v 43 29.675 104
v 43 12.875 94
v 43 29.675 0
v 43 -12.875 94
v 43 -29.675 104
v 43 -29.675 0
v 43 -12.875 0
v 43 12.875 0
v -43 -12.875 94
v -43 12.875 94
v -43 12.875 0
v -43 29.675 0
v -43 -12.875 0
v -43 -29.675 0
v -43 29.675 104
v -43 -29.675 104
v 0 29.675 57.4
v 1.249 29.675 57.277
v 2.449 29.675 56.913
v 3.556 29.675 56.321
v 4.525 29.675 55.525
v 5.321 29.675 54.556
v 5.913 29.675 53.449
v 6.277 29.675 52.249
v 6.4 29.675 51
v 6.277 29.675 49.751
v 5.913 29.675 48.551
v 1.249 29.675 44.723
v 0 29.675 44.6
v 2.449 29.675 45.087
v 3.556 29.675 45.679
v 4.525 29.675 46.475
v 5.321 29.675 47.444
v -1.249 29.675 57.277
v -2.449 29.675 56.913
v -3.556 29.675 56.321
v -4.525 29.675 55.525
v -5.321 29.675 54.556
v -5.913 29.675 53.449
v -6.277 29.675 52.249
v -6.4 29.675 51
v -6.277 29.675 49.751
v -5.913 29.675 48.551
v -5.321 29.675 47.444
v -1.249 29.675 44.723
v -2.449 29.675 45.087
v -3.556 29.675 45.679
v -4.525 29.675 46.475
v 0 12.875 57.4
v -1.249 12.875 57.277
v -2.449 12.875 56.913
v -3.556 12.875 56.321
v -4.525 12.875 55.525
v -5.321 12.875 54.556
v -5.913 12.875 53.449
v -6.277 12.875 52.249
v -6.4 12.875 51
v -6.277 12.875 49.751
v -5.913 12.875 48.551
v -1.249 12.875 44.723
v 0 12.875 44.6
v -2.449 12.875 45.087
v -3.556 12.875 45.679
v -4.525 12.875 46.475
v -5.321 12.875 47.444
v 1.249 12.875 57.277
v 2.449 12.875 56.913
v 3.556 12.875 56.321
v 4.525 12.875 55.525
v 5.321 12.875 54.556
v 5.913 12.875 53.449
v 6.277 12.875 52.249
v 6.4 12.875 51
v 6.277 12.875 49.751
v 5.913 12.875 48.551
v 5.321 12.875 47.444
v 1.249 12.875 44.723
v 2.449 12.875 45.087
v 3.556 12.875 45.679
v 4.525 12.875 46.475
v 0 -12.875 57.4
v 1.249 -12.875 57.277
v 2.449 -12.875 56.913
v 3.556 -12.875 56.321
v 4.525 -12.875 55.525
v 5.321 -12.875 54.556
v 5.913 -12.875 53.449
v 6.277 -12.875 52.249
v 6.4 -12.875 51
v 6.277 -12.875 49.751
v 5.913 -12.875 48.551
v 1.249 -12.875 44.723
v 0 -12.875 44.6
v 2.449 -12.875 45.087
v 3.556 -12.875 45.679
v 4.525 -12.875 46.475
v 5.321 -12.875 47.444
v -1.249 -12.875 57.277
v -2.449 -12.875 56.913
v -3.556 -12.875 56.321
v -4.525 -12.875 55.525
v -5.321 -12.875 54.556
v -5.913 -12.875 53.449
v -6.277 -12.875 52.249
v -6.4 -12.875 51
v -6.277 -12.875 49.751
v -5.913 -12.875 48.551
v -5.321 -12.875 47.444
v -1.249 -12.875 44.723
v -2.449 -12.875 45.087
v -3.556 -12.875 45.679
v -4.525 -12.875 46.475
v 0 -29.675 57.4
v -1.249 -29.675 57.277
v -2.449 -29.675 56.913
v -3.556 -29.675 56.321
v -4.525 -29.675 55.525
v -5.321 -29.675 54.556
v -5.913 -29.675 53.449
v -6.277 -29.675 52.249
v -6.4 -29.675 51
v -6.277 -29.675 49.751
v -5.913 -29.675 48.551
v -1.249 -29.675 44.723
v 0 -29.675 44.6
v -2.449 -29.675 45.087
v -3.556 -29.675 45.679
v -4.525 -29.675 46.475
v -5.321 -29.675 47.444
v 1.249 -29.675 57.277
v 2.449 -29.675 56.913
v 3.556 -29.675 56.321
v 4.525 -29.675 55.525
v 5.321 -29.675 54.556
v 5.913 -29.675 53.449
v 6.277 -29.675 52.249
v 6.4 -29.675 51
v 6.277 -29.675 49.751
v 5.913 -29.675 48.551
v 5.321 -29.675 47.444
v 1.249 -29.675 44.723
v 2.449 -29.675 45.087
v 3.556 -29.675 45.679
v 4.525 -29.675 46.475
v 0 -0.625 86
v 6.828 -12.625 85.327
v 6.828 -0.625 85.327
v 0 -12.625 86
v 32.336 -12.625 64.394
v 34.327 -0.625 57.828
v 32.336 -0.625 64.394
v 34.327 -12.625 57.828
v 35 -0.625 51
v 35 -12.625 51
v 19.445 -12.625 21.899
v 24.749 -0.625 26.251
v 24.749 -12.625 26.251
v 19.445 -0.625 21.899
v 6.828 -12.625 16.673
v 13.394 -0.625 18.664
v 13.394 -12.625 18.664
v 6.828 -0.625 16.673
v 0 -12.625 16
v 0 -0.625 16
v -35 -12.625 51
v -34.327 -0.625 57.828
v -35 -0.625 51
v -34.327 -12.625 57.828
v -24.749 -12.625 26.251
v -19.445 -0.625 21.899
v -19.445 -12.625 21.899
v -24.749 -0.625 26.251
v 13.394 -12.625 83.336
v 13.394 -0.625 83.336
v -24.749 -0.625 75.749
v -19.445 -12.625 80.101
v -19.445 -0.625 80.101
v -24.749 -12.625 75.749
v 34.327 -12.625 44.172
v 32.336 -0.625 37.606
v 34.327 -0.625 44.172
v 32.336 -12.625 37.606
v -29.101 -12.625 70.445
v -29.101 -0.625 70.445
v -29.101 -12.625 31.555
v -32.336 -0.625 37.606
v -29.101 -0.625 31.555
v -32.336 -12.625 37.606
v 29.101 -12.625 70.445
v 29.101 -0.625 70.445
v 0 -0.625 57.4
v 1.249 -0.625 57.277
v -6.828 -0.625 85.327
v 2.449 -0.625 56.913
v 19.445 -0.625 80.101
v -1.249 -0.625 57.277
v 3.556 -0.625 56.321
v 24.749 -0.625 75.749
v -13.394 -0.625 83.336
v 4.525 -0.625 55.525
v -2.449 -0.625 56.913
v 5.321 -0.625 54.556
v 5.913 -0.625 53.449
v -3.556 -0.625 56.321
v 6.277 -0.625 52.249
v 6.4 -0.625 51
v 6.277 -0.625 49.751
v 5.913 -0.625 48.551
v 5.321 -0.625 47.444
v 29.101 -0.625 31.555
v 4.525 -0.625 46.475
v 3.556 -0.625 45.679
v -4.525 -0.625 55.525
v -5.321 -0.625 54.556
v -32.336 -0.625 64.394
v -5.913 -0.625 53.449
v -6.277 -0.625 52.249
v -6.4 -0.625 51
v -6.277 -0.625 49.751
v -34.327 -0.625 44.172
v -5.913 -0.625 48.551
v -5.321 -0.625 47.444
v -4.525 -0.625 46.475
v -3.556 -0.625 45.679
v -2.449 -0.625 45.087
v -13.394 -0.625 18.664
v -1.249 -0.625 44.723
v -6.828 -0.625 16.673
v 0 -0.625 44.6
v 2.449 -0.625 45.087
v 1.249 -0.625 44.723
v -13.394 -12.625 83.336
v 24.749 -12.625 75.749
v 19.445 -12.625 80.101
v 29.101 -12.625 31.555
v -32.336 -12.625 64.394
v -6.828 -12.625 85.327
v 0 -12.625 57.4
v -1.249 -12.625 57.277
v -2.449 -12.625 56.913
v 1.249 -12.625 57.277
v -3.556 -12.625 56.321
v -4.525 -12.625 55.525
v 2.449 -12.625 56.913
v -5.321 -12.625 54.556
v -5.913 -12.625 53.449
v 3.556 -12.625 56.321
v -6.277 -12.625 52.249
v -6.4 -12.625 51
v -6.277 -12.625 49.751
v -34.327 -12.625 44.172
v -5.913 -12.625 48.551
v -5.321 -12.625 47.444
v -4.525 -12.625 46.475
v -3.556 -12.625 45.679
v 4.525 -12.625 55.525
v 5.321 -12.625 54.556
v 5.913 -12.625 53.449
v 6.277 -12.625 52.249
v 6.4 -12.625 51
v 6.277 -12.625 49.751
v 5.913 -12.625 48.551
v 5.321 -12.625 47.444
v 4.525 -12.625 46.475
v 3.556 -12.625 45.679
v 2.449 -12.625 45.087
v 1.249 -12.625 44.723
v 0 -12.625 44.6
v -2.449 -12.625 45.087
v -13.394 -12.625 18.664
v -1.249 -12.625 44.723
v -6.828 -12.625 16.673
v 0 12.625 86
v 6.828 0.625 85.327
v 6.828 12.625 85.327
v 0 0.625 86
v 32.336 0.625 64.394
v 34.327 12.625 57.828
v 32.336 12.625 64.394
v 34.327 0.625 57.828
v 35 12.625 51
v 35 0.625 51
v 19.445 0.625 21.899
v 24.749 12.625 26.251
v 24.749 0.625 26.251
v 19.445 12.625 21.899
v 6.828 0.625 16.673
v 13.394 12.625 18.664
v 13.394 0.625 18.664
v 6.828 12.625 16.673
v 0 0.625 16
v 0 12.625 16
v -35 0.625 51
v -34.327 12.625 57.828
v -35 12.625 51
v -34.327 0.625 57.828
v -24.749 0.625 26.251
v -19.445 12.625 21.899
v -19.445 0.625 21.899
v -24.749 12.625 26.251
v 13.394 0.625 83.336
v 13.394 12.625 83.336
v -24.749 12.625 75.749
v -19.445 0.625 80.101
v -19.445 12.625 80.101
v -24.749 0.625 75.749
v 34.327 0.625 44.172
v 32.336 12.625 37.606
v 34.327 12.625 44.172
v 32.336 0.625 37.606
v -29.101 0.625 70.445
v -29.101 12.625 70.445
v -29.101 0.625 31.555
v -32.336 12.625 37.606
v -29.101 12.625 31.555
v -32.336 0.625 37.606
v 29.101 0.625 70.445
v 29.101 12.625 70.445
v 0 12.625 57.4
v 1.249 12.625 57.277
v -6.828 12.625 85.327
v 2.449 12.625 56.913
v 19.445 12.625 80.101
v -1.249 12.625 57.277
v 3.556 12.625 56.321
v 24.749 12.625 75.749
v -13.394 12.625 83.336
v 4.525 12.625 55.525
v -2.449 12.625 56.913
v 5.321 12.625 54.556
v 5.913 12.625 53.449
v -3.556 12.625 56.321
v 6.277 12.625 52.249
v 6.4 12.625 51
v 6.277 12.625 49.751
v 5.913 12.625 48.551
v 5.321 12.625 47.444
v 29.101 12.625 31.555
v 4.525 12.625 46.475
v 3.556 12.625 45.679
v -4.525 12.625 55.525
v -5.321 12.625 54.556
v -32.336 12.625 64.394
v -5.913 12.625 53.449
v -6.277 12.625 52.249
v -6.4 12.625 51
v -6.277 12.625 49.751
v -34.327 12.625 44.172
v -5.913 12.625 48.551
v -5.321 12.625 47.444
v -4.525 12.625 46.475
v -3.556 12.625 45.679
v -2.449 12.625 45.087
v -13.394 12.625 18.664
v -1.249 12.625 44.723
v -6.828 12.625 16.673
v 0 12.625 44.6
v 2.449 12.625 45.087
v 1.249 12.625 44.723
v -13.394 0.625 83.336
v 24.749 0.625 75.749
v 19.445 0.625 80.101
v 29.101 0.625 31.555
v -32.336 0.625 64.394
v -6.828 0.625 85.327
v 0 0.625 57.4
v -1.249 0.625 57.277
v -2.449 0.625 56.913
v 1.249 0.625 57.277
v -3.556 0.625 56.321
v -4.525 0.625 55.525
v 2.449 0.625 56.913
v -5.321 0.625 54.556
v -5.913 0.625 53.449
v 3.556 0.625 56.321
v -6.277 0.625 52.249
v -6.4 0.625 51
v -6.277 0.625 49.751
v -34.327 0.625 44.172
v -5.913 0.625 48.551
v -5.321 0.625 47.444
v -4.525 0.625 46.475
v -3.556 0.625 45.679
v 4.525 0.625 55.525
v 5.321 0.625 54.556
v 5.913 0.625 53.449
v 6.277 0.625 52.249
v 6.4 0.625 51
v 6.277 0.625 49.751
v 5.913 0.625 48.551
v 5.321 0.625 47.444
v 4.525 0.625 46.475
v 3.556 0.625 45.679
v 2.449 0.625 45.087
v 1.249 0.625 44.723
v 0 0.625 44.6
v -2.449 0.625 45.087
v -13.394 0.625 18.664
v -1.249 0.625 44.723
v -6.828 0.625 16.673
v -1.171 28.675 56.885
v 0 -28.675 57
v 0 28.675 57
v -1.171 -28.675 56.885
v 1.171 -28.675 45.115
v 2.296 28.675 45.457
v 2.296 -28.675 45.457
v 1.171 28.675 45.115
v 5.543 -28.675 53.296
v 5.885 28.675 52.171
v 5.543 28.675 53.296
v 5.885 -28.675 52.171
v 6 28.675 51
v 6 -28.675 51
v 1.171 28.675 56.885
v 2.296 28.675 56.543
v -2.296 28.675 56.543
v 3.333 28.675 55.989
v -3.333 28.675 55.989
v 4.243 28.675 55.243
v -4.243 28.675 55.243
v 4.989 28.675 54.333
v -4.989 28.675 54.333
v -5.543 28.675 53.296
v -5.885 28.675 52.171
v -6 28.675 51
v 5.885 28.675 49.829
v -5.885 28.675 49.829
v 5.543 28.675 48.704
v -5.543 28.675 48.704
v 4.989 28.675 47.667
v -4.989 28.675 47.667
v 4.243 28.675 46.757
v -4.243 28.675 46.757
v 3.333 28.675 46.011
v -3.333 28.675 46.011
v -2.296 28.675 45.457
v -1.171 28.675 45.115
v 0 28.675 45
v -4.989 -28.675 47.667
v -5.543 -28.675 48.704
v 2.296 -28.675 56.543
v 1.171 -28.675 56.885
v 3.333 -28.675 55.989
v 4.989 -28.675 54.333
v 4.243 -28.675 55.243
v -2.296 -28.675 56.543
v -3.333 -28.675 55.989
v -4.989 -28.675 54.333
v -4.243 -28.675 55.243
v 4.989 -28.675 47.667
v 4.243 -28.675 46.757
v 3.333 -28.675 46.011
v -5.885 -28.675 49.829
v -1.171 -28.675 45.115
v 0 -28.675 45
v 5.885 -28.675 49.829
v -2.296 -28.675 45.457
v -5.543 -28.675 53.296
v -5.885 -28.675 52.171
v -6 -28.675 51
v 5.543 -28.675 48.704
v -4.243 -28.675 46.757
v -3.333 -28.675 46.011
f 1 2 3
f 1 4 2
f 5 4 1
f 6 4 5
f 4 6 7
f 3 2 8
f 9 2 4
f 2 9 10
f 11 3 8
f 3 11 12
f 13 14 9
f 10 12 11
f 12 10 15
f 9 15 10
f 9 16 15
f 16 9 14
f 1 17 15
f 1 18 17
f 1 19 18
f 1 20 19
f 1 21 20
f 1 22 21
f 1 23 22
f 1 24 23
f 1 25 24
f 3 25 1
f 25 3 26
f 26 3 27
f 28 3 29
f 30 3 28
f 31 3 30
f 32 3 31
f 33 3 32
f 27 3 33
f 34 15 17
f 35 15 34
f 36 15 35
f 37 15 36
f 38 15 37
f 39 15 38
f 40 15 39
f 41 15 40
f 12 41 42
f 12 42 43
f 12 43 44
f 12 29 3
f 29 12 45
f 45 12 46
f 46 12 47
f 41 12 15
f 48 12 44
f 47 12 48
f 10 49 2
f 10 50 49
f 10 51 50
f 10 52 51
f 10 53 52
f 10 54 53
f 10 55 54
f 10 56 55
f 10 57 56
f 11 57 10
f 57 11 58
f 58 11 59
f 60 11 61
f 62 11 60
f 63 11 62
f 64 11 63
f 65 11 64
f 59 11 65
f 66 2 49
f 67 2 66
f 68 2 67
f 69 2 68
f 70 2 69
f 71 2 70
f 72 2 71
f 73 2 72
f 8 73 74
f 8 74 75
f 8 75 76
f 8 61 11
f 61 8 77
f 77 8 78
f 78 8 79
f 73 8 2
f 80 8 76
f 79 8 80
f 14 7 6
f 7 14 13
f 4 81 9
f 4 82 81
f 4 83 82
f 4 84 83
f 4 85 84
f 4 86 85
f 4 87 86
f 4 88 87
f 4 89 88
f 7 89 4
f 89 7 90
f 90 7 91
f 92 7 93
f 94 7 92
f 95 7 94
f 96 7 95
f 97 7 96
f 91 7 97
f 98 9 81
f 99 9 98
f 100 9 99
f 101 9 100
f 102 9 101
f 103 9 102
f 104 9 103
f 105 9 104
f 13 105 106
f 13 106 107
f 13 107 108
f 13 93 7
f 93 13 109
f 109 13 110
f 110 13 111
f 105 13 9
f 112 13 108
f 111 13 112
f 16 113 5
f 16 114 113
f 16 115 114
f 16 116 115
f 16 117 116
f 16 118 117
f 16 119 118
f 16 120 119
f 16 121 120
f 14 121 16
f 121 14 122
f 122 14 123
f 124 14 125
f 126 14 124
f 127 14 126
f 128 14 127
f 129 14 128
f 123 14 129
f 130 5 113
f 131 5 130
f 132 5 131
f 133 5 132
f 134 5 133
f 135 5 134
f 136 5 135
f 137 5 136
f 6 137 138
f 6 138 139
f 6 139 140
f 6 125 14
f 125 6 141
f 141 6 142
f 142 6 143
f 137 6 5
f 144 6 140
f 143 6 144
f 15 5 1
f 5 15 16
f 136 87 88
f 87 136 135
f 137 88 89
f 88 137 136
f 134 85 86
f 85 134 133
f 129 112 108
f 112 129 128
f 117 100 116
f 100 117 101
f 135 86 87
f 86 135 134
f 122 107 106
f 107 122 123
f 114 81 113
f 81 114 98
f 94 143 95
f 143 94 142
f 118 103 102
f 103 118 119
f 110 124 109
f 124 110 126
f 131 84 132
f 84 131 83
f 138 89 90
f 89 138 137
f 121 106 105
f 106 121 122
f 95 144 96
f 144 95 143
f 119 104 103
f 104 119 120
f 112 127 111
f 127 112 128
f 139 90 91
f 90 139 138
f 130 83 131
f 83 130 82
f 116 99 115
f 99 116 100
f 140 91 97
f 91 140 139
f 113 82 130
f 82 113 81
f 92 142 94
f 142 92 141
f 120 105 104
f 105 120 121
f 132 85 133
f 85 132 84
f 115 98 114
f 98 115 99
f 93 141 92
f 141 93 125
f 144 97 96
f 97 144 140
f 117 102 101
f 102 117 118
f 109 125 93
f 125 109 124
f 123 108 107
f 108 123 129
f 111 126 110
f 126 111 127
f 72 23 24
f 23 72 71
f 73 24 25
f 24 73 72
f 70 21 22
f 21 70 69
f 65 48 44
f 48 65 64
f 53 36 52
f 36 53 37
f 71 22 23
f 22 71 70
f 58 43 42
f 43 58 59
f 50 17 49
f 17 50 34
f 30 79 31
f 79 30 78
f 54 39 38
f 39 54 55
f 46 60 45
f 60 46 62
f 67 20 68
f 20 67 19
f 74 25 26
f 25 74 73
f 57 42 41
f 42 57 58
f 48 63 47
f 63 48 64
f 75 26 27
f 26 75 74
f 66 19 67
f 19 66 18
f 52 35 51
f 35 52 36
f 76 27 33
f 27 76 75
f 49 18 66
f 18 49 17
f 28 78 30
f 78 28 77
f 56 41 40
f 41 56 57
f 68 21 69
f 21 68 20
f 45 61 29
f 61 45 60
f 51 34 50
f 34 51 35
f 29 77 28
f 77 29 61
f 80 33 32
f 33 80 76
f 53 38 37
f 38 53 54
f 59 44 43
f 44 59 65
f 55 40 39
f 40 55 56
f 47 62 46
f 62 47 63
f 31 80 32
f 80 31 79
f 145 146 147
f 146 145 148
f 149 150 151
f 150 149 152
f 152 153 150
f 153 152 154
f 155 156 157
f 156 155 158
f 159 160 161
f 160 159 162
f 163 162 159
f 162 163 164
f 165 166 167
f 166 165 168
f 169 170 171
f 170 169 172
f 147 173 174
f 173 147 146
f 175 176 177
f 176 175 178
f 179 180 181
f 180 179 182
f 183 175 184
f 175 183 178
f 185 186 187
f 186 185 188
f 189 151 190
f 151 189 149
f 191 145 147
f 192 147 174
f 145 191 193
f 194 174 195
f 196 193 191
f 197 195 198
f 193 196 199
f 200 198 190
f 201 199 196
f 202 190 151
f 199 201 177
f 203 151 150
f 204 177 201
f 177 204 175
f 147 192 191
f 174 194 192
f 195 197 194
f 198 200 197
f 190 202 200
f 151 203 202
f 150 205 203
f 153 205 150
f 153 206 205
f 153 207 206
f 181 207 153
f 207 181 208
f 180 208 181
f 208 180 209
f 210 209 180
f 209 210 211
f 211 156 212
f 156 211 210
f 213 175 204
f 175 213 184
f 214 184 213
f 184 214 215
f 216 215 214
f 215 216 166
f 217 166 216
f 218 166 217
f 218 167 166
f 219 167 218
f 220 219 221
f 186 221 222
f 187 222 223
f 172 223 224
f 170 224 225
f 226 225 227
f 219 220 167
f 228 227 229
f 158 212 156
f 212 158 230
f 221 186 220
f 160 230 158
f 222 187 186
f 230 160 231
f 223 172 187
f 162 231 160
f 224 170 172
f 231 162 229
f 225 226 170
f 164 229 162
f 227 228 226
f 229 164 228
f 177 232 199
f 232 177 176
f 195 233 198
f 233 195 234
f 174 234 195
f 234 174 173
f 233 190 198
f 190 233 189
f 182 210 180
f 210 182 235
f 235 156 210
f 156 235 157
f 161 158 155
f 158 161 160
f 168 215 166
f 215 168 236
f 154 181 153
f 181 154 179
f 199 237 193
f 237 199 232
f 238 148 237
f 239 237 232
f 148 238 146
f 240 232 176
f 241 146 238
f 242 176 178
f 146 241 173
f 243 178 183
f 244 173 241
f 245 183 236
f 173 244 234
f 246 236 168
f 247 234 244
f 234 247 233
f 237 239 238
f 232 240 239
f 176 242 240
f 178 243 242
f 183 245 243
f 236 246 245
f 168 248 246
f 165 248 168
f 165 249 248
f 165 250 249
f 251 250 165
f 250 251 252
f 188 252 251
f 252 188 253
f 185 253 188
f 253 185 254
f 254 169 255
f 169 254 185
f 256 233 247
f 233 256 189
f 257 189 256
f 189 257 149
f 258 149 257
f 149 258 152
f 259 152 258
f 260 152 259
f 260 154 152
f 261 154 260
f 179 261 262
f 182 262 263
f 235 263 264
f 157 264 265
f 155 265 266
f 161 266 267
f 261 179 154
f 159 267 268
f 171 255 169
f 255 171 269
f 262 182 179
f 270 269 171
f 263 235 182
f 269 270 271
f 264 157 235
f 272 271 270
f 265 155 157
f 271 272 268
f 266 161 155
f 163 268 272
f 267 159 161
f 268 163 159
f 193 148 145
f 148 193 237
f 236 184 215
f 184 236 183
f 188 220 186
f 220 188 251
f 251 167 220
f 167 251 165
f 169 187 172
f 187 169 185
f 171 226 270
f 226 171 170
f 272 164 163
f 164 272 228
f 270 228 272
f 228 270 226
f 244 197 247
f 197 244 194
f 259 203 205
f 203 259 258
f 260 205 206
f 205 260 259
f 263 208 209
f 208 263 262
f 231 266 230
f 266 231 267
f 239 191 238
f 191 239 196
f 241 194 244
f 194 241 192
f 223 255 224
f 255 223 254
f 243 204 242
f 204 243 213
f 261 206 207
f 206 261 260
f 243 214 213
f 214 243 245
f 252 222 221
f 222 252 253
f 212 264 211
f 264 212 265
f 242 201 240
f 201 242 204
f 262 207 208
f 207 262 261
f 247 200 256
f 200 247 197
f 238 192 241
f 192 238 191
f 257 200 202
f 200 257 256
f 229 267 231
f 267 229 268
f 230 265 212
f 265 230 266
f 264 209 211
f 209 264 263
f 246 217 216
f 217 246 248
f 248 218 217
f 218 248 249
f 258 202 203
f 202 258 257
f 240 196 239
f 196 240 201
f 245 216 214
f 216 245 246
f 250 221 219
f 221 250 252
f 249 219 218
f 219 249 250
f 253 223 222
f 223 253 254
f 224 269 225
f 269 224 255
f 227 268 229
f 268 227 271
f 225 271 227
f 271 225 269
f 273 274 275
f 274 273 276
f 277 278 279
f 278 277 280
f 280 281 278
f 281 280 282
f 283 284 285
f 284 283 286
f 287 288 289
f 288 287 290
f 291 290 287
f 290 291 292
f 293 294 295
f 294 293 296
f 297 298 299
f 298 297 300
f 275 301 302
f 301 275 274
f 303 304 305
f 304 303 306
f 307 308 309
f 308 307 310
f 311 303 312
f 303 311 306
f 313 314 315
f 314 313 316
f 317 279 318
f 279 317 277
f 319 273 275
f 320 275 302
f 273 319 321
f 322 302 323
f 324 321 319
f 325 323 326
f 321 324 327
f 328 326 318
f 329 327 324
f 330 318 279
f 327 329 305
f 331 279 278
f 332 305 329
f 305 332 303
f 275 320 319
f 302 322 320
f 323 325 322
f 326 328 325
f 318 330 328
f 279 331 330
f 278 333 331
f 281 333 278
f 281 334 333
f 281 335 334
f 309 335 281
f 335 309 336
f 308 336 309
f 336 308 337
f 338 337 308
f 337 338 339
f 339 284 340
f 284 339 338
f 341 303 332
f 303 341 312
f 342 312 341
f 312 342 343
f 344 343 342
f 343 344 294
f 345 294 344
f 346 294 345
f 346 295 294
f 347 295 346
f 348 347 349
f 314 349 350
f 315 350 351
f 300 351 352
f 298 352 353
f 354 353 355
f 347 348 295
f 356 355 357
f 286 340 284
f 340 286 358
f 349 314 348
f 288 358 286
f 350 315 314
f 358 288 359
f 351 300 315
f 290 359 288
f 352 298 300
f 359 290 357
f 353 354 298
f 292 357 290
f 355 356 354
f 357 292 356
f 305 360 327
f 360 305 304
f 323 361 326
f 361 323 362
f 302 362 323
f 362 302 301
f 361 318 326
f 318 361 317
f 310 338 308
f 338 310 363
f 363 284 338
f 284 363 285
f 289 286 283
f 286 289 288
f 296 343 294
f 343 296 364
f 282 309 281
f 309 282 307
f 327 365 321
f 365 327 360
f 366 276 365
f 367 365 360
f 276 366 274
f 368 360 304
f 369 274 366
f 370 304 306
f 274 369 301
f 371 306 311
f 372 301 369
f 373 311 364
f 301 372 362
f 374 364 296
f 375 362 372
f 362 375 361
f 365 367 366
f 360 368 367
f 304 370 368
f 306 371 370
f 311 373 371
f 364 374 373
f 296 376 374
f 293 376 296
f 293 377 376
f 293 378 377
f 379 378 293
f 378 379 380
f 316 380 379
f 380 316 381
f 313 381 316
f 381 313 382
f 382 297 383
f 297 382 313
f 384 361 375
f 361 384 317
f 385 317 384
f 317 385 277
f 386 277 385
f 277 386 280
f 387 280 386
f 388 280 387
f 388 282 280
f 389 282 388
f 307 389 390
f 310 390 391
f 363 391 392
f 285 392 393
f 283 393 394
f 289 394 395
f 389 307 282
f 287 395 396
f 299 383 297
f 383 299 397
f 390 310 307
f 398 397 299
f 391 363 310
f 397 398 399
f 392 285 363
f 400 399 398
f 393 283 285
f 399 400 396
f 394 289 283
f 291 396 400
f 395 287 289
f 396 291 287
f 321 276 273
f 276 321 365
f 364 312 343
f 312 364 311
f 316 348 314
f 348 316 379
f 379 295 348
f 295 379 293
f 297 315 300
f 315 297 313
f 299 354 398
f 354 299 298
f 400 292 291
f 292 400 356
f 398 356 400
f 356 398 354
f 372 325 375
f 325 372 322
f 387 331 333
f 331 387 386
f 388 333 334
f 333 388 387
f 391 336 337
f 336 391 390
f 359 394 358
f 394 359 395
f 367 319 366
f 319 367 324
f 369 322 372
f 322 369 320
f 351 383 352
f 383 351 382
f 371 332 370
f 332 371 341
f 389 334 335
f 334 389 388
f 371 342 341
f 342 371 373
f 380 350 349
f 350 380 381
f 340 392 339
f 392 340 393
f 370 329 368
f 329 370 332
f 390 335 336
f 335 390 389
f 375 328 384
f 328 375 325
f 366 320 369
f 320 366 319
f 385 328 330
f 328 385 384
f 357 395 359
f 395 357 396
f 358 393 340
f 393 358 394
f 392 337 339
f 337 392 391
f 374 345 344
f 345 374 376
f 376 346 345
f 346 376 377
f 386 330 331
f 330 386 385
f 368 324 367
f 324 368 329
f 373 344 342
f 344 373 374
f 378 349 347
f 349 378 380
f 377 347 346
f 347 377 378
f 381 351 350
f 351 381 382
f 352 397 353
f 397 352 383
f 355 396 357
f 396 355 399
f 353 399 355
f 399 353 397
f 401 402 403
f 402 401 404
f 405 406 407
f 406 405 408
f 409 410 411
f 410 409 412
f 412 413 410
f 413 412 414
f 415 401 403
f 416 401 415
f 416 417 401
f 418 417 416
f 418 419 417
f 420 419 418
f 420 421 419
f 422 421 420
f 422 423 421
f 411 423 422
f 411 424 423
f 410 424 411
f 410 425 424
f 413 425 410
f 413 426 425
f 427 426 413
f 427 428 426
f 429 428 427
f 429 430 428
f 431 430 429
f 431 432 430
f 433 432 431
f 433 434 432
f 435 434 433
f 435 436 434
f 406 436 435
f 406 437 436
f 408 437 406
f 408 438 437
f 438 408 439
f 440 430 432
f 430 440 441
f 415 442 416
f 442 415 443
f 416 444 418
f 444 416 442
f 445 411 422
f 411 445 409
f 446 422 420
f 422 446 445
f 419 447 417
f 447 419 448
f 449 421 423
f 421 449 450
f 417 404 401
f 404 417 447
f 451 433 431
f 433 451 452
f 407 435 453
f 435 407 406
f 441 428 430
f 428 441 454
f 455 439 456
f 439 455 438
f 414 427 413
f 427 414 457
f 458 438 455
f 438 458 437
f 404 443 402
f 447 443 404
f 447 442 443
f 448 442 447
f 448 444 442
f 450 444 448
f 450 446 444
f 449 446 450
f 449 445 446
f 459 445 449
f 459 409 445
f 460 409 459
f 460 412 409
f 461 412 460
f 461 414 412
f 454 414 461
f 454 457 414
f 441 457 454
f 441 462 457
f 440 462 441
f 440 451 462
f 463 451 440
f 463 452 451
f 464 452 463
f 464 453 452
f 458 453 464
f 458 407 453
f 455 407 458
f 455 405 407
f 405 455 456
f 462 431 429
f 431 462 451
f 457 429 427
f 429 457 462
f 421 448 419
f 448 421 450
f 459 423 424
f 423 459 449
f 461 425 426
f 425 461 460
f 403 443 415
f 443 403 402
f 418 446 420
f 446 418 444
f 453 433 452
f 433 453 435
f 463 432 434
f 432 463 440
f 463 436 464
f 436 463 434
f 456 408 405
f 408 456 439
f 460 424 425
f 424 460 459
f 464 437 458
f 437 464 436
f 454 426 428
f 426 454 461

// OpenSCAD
$fn = 32;

// ------------------------------------------------------------------------
// Trolley wheel set: wheels d70, fork 94 mm tall
// Every part is its own module, assembly() places every instance.
// ------------------------------------------------------------------------

// --- part 1 ---
module trolley_fork() {
  difference() {
    union() {
      translate([-43, 12.875, 0]) cube([86, 16.8, 94]);
      translate([-43, -29.675, 0]) cube([86, 16.8, 94]);
      translate([-43, -29.675, 94]) cube([86, 59.35, 10]);
    }
    translate([0, -21.275, 51]) rotate([90, 0, 0]) cylinder(h = 18.8, d = 12.8, center = true);
    translate([0, 21.275, 51]) rotate([90, 0, 0]) cylinder(h = 18.8, d = 12.8, center = true);
  }
}

// --- part 2 ---
module trolley_wheel() {
  difference() {
      translate([0, 0, 0]) cylinder(h = 12, d = 70);
      translate([0, 0, -1]) cylinder(h = 14, d = 12.8);
    }
}

// --- part 3 ---
module trolley_axle() {
  translate([0, 0, -28.675]) cylinder(h = 57.35, d = 12);
}

// --- assembly ---
module assembly() {
  color([0.80, 0.24, 0.20]) translate([0, 0, 0]) rotate([0, 0, 0]) trolley_fork();
  color([0.20, 0.45, 0.75]) translate([0, -0.625, 51]) rotate([90, 0, 0]) trolley_wheel();
  color([0.25, 0.62, 0.32]) translate([0, 12.625, 51]) rotate([90, 0, 0]) trolley_wheel();
  color([0.92, 0.70, 0.18]) translate([0, 0, 51]) rotate([90, 0, 0]) trolley_axle();
}

assembly();
